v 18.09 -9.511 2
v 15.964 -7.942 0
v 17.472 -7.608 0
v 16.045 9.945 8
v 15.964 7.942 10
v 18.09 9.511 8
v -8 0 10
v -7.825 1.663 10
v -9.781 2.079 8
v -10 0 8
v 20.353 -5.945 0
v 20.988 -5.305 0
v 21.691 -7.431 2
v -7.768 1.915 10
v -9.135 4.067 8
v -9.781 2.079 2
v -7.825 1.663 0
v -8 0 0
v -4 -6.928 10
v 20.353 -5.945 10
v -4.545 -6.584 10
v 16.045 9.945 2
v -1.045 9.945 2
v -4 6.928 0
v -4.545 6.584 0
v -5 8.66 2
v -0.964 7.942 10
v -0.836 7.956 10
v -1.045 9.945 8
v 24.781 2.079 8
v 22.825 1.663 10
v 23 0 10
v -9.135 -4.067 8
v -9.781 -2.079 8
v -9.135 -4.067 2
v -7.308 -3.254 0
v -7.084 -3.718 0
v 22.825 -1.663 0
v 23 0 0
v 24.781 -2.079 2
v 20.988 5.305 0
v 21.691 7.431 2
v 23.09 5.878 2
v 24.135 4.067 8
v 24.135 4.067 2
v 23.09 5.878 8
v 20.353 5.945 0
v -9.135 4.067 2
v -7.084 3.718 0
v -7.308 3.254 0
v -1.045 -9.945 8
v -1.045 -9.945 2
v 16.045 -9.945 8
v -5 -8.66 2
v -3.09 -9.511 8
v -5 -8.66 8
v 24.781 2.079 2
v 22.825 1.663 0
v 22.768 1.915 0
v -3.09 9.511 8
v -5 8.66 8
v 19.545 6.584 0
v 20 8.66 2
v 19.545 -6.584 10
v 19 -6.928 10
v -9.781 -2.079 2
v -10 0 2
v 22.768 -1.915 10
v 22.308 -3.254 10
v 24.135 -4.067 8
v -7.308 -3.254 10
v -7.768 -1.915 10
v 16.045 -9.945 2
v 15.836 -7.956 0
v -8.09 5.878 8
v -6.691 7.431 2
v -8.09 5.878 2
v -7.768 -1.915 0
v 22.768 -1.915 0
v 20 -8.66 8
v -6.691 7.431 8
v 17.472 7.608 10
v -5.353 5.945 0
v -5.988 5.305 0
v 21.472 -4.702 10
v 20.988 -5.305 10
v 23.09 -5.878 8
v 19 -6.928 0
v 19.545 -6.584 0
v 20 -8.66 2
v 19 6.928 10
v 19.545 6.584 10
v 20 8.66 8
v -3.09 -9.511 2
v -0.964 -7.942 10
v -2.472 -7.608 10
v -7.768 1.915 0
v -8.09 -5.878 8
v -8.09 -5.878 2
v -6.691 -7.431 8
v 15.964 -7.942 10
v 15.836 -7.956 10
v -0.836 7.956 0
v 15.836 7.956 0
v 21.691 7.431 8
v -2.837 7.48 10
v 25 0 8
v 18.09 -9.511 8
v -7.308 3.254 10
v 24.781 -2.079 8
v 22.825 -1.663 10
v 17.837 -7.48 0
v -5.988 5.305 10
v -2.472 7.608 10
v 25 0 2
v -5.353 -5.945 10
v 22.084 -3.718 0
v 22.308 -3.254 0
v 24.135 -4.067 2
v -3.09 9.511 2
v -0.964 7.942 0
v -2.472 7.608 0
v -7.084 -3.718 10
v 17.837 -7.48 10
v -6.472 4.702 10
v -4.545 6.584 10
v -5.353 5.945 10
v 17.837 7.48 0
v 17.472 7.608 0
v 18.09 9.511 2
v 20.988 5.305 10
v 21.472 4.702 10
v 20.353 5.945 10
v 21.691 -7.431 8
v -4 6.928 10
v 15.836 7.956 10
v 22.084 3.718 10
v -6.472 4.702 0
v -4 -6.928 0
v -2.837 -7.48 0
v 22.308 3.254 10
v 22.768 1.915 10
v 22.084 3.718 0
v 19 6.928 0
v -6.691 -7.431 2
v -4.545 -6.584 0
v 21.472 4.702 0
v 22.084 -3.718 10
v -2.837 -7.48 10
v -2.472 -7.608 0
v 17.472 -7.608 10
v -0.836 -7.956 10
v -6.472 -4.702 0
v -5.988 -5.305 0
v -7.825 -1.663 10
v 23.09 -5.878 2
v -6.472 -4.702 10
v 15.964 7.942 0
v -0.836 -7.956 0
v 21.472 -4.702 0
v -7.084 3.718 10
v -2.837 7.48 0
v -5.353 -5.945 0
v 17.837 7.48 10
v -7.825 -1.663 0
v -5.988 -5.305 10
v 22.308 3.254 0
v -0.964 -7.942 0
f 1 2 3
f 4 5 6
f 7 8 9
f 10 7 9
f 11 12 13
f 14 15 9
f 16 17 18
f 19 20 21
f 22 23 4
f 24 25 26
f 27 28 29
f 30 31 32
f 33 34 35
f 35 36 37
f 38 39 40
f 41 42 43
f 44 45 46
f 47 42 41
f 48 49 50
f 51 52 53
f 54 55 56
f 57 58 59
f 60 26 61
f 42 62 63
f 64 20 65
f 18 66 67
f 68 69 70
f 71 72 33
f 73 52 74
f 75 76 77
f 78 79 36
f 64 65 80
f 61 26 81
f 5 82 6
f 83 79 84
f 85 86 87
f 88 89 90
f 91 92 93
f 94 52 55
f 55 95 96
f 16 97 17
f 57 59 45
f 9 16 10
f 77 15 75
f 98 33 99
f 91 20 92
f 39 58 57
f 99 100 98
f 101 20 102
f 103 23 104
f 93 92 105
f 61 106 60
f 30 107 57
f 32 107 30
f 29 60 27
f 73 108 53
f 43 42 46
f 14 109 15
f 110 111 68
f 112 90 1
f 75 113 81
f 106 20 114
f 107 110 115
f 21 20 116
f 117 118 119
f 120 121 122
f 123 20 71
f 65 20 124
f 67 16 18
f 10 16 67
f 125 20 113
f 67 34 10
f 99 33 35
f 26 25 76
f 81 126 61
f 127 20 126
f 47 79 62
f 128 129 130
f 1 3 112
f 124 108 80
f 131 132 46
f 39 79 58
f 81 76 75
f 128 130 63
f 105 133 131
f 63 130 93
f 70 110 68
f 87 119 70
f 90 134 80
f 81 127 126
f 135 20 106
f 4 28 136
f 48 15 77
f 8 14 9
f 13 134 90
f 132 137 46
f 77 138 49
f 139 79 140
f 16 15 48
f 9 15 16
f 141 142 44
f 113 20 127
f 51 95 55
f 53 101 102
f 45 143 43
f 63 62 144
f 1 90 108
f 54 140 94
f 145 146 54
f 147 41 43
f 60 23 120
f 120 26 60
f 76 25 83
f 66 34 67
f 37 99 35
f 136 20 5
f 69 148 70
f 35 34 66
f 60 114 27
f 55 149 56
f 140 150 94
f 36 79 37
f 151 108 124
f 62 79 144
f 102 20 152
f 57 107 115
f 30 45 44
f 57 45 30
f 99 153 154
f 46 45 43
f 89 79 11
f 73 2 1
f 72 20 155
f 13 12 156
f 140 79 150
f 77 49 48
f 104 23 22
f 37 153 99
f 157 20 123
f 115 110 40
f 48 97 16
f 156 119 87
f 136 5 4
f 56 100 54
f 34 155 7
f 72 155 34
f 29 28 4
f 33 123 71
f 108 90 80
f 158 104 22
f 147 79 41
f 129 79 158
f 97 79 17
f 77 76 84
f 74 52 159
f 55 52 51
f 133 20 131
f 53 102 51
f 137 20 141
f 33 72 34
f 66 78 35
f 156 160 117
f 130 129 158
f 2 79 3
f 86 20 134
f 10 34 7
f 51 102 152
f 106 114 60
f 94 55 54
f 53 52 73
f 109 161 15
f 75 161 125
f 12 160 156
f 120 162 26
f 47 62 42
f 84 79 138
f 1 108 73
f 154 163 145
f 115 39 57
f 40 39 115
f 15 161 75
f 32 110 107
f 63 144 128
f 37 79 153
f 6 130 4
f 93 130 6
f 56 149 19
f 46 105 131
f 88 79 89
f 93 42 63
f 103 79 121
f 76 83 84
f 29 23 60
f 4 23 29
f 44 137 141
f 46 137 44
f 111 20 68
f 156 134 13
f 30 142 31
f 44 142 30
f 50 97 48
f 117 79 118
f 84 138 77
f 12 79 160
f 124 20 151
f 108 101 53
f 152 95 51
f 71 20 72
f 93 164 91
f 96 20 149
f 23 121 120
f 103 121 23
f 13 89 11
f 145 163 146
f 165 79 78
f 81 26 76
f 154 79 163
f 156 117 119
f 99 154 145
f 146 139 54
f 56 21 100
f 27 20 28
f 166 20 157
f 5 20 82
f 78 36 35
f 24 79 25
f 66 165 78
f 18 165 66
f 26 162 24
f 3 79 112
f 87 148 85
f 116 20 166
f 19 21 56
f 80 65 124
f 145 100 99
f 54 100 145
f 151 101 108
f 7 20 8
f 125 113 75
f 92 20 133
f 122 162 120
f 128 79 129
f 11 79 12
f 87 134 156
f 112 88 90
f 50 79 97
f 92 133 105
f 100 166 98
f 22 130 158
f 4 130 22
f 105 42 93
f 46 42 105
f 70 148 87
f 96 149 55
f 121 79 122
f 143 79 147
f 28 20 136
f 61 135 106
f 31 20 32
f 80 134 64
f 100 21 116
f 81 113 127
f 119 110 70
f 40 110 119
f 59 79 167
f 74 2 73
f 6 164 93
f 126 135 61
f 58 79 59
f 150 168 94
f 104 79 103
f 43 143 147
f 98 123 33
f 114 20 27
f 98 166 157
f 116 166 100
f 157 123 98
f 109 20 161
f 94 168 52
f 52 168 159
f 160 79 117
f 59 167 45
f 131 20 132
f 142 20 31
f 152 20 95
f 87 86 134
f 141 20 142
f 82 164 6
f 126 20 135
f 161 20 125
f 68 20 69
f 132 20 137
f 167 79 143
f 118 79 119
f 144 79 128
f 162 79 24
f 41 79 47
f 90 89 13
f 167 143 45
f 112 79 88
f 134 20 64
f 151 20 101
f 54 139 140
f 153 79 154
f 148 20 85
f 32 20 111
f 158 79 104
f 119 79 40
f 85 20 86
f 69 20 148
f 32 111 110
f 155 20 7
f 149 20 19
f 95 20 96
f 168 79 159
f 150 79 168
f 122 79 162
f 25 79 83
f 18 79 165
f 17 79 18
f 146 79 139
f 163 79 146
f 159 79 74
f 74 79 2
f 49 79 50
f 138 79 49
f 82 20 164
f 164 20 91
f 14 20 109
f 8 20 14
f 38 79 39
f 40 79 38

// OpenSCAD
// file: shapes/inverted_chamfer_cylinder.scad
use <torus.scad>;

inverted_chamfer_cylinder();

module inverted_chamfer_cylinder(
    h = 7, 
    r = 15, 
    chamfer_radius = 1,
    extra_margin_bottom = 1,
    extra_margin_top = 1)
{    
    chamfer_diameter = chamfer_radius * 2;
    
    union()
    {
        translate([0, 0, h-chamfer_radius])
        hull()
        {            
            inverted_chamfer_rim_top();    
            
            translate([0,0,chamfer_radius])
            cylinder(
                h = extra_margin_top,
                r = r + chamfer_radius);
        }
        
        cylinder(h=h, r=r);
        
        hull()
        {            
            inverted_chamfer_rim_bottom();
            translate([0,0,-extra_margin_bottom])
            cylinder(
                h = extra_margin_bottom,
                r = r + chamfer_radius);
        }
    }
    
    module inverted_chamfer_rim_top()
    {
        difference()
        {
            inverted_chamfer_torus();
            
            translate([0,0,chamfer_radius])
            cylinder(
                h = chamfer_radius,
                r = r + chamfer_radius);
        }
    }
    
    module inverted_chamfer_rim_bottom()
    {
        translate([0,0,-chamfer_radius])
        difference()
        {
            inverted_chamfer_torus();
            
            cylinder(
                h = chamfer_radius,
                r = r + chamfer_radius);
        }
    }
    
    module inverted_chamfer_torus()
    {
        torus(h = chamfer_diameter, r = r + chamfer_radius, sides = 4);
    }
}
// file: shapes/chamfer_cylinder.scad
use <torus.scad>;

chamfer_cylinder();

module chamfer_cylinder(
    h = 1, 
    r = 1, 
    chamfer_radius = 1)
{
    chamfer_diameter = chamfer_radius * 2;
    union()
    {
        translate([0, 0, h-chamfer_diameter])
        chamfer_torus();    
        
        cylinder(
            h = h, 
            r = r - chamfer_radius);
        
        translate([0, 0, chamfer_radius])
        cylinder(
            h = h - (chamfer_radius * 2), 
            r = r);
        
        chamfer_torus();
    }
    
    module chamfer_torus()
    {
        torus(h = chamfer_diameter, r = r, sides = 4);
    }
}
// file: shapes/torus.scad
torus();

module torus(
    h = 2,     
    r = 10,   
    sides = $fn)
{
    tube_radius = h / 2;
    inside_radius = r - tube_radius;
    //translate([r,r,thickness_radius])
    translate([0,0,tube_radius])
    rotate_extrude()
    translate([inside_radius, 0, 0])
    circle(r = tube_radius, $fn = sides);
}
// file: shapes/bearing_race.scad
use <bearing_race_hole.scad>;

bearing_race();

module bearing_race(
    h = 10, 
    id = 28,
    od = 30,
    spline_qty = 8,
    spline_depth = 1)
{
    difference()
    {
        cylinder(
            h = h, 
            r = od / 2);
        
        bearing_race_hole(
            h = h,
            r = id / 2,
            spline_qty = spline_qty,
            spline_depth = spline_depth
        );
    }    
}
// file: shapes/bearing_race_hole.scad
use <bearing_race_spline.scad>;

module bearing_race_hole(
    h = 10, 
    r = 22,
    spline_qty = 4,
    spline_depth = 1,
    extra_margin_bottom = 1,
    extra_margin_top = 1)
{
    difference()
    {
        translate([0,0,-extra_margin_bottom])
        cylinder(
            h = h + extra_margin_bottom + extra_margin_top, 
            r = r);
        
        rotate([0,0,360 / spline_qty / 2])
        splines();
    }
    
    module splines()
    {        
        for (i = [1:spline_qty])
        {
            angle = i * (360 / spline_qty);
            rotate([0,0,angle])
            translate([r,0,0])
            bearing_race_spline(h = h, r = spline_depth, taper = h / 4, $fn = 8);
        }        
    }
}
// file: shapes/bearing_race_spline.scad
bearing_race_spline();

module bearing_race_spline(
    h = 10, 
    r = 1,
    taper = 2.5)
{
    cylinder_height = h - (taper * 2);
    
    translate([0,0,taper + cylinder_height])
    cylinder(h = taper, r1 = r, r2 = 0);
    
    translate([0,0,taper])
    cylinder(h = cylinder_height, r = r);
    
    cylinder(h = taper, r1 = 0, r2 = r);
}
// file: shapes/shapes.lib.scad
use <bearing_race_spline.scad>;
use <bearing_race_hole.scad>;
use <bearing_race.scad>;
use <torus.scad>;
use <chamfer_cylinder.scad>;
use <inverted_chamfer_cylinder.scad>;
// main file
include <shapes/shapes.lib.scad>;

leg();

module leg(
    h = 10,
    r = 10,
    chamfer_radius = 2, 
    separation = 15)
{        
    hull() 
    {            
        chamfer_cylinder(h, r, chamfer_radius);
    
        translate([separation, 0, 0])            
        chamfer_cylinder(h, r, chamfer_radius);
    }
}
